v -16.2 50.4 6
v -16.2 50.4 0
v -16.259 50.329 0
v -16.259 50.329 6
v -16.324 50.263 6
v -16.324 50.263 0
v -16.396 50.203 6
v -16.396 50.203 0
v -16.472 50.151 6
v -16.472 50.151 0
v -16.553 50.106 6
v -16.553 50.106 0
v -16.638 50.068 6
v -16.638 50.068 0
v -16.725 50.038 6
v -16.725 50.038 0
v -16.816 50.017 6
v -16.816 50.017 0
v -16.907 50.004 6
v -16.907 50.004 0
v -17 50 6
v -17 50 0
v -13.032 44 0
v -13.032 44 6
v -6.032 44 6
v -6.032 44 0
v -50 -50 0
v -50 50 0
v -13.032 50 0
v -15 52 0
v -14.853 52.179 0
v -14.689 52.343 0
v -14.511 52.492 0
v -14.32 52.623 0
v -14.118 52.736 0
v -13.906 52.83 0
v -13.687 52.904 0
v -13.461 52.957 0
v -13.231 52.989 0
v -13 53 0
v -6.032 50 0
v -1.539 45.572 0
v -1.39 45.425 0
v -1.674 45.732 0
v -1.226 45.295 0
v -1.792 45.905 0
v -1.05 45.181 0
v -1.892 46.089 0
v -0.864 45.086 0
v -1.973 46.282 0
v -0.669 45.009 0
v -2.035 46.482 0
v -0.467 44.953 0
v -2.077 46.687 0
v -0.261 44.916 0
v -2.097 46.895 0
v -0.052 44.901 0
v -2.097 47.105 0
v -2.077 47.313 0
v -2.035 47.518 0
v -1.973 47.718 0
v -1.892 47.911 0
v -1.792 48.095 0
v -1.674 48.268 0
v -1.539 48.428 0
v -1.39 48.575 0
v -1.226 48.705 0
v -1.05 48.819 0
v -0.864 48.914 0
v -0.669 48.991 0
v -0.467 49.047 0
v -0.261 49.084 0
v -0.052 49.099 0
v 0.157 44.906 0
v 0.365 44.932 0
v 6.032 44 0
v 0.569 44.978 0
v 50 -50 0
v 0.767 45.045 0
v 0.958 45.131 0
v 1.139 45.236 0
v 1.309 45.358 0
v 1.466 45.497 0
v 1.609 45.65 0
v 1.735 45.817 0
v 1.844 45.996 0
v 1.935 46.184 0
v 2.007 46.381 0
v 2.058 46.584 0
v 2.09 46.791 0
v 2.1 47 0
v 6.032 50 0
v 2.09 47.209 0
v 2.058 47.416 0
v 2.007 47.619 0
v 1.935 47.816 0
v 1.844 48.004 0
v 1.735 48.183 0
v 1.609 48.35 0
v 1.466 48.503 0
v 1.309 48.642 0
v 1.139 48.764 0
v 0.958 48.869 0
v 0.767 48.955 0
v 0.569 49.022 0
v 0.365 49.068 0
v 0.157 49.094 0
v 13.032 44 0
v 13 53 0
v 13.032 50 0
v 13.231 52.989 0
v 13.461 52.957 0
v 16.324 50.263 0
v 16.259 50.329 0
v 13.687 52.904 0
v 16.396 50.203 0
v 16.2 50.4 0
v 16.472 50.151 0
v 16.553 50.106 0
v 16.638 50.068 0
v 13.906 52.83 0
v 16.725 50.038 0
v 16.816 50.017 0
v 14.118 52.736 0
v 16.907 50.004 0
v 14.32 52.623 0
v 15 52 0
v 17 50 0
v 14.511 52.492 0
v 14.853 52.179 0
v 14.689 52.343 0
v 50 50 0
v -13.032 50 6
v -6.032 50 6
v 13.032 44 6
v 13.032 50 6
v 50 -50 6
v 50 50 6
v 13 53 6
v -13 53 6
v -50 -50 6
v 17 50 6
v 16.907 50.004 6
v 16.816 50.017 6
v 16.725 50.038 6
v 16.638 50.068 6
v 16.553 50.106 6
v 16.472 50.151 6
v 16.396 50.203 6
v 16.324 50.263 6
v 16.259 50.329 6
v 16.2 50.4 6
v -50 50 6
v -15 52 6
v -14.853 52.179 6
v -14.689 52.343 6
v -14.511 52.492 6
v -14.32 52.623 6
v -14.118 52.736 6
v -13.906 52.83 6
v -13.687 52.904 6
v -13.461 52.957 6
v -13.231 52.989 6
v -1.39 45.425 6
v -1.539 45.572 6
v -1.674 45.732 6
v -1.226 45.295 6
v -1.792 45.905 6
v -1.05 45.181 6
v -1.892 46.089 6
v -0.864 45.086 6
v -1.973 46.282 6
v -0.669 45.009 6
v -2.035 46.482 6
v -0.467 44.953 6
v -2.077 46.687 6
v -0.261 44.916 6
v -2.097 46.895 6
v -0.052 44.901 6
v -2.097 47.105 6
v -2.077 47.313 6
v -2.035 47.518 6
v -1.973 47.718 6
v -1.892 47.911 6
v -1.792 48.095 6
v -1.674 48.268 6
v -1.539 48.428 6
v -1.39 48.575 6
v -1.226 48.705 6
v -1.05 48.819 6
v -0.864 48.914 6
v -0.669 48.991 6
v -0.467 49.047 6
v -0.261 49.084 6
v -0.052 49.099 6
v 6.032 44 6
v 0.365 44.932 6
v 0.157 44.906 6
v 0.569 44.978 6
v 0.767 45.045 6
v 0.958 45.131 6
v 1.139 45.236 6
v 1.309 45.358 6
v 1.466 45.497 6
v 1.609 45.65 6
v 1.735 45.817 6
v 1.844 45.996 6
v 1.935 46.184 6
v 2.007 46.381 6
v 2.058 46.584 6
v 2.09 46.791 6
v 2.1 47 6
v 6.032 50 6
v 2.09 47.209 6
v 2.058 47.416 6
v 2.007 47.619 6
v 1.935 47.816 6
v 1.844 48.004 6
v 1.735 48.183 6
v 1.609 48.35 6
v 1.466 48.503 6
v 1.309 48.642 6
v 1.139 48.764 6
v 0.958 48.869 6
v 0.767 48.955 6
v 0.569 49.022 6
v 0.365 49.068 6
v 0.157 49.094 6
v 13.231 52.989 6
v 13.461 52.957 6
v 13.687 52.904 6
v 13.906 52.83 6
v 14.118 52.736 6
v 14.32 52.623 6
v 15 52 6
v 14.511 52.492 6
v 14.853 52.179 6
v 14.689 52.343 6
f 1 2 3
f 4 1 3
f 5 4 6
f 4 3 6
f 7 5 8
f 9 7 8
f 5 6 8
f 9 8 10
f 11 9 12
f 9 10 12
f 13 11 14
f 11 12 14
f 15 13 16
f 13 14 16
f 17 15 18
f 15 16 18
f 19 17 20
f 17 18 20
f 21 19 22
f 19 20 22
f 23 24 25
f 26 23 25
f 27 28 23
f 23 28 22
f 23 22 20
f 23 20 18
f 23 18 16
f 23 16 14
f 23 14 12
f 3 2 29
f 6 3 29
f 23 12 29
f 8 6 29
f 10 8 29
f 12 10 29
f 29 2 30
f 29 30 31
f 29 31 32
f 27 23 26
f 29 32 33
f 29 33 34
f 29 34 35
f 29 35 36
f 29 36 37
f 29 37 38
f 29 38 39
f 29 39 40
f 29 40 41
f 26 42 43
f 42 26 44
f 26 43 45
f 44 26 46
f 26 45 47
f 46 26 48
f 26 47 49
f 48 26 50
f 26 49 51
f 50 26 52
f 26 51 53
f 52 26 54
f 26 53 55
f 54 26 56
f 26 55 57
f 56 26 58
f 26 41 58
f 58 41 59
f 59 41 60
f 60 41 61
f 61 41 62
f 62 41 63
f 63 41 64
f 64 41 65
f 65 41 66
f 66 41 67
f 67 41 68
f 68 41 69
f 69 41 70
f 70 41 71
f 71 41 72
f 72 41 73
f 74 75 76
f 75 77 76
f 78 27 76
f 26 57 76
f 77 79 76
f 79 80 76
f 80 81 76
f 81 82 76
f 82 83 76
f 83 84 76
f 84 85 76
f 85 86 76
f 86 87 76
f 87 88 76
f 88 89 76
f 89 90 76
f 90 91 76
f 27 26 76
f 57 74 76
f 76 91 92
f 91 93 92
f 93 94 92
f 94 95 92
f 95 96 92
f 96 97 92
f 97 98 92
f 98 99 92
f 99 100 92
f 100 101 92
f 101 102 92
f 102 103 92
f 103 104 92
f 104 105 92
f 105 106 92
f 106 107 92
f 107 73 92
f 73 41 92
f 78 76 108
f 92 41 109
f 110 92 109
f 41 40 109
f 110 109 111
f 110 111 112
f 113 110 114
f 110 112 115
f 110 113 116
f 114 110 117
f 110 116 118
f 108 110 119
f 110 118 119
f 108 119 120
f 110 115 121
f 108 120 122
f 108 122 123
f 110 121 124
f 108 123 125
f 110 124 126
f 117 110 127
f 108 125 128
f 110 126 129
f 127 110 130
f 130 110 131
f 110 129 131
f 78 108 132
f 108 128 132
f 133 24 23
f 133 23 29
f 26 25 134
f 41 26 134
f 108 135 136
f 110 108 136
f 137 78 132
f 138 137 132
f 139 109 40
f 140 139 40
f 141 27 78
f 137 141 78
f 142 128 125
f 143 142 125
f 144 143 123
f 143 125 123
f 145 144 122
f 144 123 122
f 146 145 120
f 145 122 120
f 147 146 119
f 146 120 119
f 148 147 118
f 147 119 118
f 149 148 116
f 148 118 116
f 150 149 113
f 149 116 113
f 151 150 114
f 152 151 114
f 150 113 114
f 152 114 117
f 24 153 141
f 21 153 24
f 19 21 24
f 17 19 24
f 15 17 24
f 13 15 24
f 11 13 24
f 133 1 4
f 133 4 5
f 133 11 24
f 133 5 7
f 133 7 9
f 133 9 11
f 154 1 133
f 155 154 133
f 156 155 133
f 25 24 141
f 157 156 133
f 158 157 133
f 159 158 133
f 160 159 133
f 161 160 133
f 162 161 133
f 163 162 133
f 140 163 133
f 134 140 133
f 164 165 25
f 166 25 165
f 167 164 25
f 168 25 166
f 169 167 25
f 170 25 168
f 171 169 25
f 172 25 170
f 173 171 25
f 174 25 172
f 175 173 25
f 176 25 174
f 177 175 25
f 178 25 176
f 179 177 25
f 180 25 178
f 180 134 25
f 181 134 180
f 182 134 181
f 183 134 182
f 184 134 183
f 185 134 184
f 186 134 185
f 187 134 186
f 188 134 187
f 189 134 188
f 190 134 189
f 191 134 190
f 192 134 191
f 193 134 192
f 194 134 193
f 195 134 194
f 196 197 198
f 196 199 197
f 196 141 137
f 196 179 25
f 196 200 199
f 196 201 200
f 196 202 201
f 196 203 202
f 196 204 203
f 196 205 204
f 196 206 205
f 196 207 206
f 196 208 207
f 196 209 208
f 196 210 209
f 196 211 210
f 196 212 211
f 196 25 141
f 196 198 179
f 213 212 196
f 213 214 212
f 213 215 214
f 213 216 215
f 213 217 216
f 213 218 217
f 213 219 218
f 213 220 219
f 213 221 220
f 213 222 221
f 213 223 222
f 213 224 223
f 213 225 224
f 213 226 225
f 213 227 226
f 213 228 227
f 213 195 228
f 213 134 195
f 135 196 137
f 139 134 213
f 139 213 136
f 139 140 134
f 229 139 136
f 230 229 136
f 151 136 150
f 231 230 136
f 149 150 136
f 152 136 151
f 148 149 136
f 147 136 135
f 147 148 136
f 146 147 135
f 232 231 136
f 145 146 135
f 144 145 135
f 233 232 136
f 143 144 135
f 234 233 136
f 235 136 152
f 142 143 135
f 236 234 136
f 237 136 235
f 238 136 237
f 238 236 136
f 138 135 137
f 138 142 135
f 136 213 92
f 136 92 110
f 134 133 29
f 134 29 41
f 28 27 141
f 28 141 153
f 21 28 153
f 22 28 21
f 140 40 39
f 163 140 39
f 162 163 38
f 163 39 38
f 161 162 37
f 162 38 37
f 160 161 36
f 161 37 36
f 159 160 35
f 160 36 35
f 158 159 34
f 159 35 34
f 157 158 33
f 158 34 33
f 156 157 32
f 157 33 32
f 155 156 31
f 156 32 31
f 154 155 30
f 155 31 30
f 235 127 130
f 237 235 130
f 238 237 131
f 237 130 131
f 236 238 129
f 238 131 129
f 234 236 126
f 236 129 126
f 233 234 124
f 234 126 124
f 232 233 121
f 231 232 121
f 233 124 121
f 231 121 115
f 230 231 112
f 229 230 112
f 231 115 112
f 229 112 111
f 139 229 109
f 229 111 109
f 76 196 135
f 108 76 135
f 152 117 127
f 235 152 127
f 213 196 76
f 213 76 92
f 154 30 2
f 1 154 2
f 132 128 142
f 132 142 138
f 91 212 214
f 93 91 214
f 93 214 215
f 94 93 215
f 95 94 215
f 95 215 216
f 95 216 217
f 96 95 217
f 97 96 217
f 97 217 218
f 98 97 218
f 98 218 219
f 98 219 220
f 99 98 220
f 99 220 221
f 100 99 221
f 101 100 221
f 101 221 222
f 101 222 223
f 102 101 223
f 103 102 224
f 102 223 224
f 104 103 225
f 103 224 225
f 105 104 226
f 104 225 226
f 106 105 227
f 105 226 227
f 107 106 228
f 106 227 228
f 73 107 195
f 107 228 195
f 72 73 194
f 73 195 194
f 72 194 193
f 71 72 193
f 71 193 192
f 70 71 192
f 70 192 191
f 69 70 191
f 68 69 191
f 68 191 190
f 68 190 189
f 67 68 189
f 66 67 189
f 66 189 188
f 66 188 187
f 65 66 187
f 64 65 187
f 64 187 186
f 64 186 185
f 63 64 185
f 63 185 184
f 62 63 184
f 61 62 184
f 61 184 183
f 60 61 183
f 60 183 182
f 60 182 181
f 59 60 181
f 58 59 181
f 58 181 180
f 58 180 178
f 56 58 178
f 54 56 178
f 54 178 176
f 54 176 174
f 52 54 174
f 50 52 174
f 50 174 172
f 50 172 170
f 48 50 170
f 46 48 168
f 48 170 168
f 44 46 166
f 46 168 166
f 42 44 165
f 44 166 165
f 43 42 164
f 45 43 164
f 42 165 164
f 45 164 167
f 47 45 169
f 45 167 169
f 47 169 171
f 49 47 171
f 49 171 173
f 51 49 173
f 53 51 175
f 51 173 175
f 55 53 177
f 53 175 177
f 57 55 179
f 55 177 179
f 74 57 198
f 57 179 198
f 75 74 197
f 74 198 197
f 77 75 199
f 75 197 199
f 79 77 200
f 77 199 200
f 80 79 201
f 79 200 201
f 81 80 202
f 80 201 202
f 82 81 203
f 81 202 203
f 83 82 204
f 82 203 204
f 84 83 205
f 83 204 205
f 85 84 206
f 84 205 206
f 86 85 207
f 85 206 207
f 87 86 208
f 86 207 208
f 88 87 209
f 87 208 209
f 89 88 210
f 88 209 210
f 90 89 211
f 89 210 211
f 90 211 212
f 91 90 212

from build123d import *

# Parameters (mm, degrees)
SKETCH_1_W          = 100
SKETCH_1_H          = 100
EXTRUDE_1_DEPTH     = 6
EXTRUDE_2_DEPTH     = 6
SKETCH_3_R          = 2.1
SKETCH_3_W          = 7
SKETCH_3_H          = 6
CUT_EXTRUDE_1_DEPTH = 7


with BuildPart() as part:
    # Эскиз1 → Бобышка-Вытянуть1 (new body)
    with BuildSketch(Plane.XY):
        Rectangle(SKETCH_1_W, SKETCH_1_H)
    extrude(amount=EXTRUDE_1_DEPTH)

    # Эскиз2 → Бобышка-Вытянуть2 (add)
    with BuildSketch(Plane.XY):
        with BuildLine():
            Line((13, 53), (-13, 53))
            ThreePointArc((-13, 53), (-14.118033989, 52.736067977), (-15, 52))
            Line((-15, 52), (-16.2, 50.4))
            ThreePointArc((-16.2, 50.4), (-16.552786405, 50.105572809), (-17, 50))
            Line((-17, 50), (17, 50))
            ThreePointArc((17, 50), (16.552786405, 50.105572809), (16.2, 50.4))
            Line((16.2, 50.4), (15, 52))
            ThreePointArc((15, 52), (14.118033989, 52.736067977), (13, 53))
        make_face()
    extrude(amount=EXTRUDE_2_DEPTH)

    # Эскиз3 → Вырез-Вытянуть1 (cut, through all)
    with BuildSketch(Plane.XY.offset(6)):
        with Locations((0, 47)):
            Circle(SKETCH_3_R)
        with Locations((9.531849908, 47)):
            Rectangle(SKETCH_3_W, SKETCH_3_H)
        with Locations((-9.531849908, 47)):
            Rectangle(SKETCH_3_W, SKETCH_3_H)
    extrude(amount=-CUT_EXTRUDE_1_DEPTH, mode=Mode.SUBTRACT)


solid = part.part
